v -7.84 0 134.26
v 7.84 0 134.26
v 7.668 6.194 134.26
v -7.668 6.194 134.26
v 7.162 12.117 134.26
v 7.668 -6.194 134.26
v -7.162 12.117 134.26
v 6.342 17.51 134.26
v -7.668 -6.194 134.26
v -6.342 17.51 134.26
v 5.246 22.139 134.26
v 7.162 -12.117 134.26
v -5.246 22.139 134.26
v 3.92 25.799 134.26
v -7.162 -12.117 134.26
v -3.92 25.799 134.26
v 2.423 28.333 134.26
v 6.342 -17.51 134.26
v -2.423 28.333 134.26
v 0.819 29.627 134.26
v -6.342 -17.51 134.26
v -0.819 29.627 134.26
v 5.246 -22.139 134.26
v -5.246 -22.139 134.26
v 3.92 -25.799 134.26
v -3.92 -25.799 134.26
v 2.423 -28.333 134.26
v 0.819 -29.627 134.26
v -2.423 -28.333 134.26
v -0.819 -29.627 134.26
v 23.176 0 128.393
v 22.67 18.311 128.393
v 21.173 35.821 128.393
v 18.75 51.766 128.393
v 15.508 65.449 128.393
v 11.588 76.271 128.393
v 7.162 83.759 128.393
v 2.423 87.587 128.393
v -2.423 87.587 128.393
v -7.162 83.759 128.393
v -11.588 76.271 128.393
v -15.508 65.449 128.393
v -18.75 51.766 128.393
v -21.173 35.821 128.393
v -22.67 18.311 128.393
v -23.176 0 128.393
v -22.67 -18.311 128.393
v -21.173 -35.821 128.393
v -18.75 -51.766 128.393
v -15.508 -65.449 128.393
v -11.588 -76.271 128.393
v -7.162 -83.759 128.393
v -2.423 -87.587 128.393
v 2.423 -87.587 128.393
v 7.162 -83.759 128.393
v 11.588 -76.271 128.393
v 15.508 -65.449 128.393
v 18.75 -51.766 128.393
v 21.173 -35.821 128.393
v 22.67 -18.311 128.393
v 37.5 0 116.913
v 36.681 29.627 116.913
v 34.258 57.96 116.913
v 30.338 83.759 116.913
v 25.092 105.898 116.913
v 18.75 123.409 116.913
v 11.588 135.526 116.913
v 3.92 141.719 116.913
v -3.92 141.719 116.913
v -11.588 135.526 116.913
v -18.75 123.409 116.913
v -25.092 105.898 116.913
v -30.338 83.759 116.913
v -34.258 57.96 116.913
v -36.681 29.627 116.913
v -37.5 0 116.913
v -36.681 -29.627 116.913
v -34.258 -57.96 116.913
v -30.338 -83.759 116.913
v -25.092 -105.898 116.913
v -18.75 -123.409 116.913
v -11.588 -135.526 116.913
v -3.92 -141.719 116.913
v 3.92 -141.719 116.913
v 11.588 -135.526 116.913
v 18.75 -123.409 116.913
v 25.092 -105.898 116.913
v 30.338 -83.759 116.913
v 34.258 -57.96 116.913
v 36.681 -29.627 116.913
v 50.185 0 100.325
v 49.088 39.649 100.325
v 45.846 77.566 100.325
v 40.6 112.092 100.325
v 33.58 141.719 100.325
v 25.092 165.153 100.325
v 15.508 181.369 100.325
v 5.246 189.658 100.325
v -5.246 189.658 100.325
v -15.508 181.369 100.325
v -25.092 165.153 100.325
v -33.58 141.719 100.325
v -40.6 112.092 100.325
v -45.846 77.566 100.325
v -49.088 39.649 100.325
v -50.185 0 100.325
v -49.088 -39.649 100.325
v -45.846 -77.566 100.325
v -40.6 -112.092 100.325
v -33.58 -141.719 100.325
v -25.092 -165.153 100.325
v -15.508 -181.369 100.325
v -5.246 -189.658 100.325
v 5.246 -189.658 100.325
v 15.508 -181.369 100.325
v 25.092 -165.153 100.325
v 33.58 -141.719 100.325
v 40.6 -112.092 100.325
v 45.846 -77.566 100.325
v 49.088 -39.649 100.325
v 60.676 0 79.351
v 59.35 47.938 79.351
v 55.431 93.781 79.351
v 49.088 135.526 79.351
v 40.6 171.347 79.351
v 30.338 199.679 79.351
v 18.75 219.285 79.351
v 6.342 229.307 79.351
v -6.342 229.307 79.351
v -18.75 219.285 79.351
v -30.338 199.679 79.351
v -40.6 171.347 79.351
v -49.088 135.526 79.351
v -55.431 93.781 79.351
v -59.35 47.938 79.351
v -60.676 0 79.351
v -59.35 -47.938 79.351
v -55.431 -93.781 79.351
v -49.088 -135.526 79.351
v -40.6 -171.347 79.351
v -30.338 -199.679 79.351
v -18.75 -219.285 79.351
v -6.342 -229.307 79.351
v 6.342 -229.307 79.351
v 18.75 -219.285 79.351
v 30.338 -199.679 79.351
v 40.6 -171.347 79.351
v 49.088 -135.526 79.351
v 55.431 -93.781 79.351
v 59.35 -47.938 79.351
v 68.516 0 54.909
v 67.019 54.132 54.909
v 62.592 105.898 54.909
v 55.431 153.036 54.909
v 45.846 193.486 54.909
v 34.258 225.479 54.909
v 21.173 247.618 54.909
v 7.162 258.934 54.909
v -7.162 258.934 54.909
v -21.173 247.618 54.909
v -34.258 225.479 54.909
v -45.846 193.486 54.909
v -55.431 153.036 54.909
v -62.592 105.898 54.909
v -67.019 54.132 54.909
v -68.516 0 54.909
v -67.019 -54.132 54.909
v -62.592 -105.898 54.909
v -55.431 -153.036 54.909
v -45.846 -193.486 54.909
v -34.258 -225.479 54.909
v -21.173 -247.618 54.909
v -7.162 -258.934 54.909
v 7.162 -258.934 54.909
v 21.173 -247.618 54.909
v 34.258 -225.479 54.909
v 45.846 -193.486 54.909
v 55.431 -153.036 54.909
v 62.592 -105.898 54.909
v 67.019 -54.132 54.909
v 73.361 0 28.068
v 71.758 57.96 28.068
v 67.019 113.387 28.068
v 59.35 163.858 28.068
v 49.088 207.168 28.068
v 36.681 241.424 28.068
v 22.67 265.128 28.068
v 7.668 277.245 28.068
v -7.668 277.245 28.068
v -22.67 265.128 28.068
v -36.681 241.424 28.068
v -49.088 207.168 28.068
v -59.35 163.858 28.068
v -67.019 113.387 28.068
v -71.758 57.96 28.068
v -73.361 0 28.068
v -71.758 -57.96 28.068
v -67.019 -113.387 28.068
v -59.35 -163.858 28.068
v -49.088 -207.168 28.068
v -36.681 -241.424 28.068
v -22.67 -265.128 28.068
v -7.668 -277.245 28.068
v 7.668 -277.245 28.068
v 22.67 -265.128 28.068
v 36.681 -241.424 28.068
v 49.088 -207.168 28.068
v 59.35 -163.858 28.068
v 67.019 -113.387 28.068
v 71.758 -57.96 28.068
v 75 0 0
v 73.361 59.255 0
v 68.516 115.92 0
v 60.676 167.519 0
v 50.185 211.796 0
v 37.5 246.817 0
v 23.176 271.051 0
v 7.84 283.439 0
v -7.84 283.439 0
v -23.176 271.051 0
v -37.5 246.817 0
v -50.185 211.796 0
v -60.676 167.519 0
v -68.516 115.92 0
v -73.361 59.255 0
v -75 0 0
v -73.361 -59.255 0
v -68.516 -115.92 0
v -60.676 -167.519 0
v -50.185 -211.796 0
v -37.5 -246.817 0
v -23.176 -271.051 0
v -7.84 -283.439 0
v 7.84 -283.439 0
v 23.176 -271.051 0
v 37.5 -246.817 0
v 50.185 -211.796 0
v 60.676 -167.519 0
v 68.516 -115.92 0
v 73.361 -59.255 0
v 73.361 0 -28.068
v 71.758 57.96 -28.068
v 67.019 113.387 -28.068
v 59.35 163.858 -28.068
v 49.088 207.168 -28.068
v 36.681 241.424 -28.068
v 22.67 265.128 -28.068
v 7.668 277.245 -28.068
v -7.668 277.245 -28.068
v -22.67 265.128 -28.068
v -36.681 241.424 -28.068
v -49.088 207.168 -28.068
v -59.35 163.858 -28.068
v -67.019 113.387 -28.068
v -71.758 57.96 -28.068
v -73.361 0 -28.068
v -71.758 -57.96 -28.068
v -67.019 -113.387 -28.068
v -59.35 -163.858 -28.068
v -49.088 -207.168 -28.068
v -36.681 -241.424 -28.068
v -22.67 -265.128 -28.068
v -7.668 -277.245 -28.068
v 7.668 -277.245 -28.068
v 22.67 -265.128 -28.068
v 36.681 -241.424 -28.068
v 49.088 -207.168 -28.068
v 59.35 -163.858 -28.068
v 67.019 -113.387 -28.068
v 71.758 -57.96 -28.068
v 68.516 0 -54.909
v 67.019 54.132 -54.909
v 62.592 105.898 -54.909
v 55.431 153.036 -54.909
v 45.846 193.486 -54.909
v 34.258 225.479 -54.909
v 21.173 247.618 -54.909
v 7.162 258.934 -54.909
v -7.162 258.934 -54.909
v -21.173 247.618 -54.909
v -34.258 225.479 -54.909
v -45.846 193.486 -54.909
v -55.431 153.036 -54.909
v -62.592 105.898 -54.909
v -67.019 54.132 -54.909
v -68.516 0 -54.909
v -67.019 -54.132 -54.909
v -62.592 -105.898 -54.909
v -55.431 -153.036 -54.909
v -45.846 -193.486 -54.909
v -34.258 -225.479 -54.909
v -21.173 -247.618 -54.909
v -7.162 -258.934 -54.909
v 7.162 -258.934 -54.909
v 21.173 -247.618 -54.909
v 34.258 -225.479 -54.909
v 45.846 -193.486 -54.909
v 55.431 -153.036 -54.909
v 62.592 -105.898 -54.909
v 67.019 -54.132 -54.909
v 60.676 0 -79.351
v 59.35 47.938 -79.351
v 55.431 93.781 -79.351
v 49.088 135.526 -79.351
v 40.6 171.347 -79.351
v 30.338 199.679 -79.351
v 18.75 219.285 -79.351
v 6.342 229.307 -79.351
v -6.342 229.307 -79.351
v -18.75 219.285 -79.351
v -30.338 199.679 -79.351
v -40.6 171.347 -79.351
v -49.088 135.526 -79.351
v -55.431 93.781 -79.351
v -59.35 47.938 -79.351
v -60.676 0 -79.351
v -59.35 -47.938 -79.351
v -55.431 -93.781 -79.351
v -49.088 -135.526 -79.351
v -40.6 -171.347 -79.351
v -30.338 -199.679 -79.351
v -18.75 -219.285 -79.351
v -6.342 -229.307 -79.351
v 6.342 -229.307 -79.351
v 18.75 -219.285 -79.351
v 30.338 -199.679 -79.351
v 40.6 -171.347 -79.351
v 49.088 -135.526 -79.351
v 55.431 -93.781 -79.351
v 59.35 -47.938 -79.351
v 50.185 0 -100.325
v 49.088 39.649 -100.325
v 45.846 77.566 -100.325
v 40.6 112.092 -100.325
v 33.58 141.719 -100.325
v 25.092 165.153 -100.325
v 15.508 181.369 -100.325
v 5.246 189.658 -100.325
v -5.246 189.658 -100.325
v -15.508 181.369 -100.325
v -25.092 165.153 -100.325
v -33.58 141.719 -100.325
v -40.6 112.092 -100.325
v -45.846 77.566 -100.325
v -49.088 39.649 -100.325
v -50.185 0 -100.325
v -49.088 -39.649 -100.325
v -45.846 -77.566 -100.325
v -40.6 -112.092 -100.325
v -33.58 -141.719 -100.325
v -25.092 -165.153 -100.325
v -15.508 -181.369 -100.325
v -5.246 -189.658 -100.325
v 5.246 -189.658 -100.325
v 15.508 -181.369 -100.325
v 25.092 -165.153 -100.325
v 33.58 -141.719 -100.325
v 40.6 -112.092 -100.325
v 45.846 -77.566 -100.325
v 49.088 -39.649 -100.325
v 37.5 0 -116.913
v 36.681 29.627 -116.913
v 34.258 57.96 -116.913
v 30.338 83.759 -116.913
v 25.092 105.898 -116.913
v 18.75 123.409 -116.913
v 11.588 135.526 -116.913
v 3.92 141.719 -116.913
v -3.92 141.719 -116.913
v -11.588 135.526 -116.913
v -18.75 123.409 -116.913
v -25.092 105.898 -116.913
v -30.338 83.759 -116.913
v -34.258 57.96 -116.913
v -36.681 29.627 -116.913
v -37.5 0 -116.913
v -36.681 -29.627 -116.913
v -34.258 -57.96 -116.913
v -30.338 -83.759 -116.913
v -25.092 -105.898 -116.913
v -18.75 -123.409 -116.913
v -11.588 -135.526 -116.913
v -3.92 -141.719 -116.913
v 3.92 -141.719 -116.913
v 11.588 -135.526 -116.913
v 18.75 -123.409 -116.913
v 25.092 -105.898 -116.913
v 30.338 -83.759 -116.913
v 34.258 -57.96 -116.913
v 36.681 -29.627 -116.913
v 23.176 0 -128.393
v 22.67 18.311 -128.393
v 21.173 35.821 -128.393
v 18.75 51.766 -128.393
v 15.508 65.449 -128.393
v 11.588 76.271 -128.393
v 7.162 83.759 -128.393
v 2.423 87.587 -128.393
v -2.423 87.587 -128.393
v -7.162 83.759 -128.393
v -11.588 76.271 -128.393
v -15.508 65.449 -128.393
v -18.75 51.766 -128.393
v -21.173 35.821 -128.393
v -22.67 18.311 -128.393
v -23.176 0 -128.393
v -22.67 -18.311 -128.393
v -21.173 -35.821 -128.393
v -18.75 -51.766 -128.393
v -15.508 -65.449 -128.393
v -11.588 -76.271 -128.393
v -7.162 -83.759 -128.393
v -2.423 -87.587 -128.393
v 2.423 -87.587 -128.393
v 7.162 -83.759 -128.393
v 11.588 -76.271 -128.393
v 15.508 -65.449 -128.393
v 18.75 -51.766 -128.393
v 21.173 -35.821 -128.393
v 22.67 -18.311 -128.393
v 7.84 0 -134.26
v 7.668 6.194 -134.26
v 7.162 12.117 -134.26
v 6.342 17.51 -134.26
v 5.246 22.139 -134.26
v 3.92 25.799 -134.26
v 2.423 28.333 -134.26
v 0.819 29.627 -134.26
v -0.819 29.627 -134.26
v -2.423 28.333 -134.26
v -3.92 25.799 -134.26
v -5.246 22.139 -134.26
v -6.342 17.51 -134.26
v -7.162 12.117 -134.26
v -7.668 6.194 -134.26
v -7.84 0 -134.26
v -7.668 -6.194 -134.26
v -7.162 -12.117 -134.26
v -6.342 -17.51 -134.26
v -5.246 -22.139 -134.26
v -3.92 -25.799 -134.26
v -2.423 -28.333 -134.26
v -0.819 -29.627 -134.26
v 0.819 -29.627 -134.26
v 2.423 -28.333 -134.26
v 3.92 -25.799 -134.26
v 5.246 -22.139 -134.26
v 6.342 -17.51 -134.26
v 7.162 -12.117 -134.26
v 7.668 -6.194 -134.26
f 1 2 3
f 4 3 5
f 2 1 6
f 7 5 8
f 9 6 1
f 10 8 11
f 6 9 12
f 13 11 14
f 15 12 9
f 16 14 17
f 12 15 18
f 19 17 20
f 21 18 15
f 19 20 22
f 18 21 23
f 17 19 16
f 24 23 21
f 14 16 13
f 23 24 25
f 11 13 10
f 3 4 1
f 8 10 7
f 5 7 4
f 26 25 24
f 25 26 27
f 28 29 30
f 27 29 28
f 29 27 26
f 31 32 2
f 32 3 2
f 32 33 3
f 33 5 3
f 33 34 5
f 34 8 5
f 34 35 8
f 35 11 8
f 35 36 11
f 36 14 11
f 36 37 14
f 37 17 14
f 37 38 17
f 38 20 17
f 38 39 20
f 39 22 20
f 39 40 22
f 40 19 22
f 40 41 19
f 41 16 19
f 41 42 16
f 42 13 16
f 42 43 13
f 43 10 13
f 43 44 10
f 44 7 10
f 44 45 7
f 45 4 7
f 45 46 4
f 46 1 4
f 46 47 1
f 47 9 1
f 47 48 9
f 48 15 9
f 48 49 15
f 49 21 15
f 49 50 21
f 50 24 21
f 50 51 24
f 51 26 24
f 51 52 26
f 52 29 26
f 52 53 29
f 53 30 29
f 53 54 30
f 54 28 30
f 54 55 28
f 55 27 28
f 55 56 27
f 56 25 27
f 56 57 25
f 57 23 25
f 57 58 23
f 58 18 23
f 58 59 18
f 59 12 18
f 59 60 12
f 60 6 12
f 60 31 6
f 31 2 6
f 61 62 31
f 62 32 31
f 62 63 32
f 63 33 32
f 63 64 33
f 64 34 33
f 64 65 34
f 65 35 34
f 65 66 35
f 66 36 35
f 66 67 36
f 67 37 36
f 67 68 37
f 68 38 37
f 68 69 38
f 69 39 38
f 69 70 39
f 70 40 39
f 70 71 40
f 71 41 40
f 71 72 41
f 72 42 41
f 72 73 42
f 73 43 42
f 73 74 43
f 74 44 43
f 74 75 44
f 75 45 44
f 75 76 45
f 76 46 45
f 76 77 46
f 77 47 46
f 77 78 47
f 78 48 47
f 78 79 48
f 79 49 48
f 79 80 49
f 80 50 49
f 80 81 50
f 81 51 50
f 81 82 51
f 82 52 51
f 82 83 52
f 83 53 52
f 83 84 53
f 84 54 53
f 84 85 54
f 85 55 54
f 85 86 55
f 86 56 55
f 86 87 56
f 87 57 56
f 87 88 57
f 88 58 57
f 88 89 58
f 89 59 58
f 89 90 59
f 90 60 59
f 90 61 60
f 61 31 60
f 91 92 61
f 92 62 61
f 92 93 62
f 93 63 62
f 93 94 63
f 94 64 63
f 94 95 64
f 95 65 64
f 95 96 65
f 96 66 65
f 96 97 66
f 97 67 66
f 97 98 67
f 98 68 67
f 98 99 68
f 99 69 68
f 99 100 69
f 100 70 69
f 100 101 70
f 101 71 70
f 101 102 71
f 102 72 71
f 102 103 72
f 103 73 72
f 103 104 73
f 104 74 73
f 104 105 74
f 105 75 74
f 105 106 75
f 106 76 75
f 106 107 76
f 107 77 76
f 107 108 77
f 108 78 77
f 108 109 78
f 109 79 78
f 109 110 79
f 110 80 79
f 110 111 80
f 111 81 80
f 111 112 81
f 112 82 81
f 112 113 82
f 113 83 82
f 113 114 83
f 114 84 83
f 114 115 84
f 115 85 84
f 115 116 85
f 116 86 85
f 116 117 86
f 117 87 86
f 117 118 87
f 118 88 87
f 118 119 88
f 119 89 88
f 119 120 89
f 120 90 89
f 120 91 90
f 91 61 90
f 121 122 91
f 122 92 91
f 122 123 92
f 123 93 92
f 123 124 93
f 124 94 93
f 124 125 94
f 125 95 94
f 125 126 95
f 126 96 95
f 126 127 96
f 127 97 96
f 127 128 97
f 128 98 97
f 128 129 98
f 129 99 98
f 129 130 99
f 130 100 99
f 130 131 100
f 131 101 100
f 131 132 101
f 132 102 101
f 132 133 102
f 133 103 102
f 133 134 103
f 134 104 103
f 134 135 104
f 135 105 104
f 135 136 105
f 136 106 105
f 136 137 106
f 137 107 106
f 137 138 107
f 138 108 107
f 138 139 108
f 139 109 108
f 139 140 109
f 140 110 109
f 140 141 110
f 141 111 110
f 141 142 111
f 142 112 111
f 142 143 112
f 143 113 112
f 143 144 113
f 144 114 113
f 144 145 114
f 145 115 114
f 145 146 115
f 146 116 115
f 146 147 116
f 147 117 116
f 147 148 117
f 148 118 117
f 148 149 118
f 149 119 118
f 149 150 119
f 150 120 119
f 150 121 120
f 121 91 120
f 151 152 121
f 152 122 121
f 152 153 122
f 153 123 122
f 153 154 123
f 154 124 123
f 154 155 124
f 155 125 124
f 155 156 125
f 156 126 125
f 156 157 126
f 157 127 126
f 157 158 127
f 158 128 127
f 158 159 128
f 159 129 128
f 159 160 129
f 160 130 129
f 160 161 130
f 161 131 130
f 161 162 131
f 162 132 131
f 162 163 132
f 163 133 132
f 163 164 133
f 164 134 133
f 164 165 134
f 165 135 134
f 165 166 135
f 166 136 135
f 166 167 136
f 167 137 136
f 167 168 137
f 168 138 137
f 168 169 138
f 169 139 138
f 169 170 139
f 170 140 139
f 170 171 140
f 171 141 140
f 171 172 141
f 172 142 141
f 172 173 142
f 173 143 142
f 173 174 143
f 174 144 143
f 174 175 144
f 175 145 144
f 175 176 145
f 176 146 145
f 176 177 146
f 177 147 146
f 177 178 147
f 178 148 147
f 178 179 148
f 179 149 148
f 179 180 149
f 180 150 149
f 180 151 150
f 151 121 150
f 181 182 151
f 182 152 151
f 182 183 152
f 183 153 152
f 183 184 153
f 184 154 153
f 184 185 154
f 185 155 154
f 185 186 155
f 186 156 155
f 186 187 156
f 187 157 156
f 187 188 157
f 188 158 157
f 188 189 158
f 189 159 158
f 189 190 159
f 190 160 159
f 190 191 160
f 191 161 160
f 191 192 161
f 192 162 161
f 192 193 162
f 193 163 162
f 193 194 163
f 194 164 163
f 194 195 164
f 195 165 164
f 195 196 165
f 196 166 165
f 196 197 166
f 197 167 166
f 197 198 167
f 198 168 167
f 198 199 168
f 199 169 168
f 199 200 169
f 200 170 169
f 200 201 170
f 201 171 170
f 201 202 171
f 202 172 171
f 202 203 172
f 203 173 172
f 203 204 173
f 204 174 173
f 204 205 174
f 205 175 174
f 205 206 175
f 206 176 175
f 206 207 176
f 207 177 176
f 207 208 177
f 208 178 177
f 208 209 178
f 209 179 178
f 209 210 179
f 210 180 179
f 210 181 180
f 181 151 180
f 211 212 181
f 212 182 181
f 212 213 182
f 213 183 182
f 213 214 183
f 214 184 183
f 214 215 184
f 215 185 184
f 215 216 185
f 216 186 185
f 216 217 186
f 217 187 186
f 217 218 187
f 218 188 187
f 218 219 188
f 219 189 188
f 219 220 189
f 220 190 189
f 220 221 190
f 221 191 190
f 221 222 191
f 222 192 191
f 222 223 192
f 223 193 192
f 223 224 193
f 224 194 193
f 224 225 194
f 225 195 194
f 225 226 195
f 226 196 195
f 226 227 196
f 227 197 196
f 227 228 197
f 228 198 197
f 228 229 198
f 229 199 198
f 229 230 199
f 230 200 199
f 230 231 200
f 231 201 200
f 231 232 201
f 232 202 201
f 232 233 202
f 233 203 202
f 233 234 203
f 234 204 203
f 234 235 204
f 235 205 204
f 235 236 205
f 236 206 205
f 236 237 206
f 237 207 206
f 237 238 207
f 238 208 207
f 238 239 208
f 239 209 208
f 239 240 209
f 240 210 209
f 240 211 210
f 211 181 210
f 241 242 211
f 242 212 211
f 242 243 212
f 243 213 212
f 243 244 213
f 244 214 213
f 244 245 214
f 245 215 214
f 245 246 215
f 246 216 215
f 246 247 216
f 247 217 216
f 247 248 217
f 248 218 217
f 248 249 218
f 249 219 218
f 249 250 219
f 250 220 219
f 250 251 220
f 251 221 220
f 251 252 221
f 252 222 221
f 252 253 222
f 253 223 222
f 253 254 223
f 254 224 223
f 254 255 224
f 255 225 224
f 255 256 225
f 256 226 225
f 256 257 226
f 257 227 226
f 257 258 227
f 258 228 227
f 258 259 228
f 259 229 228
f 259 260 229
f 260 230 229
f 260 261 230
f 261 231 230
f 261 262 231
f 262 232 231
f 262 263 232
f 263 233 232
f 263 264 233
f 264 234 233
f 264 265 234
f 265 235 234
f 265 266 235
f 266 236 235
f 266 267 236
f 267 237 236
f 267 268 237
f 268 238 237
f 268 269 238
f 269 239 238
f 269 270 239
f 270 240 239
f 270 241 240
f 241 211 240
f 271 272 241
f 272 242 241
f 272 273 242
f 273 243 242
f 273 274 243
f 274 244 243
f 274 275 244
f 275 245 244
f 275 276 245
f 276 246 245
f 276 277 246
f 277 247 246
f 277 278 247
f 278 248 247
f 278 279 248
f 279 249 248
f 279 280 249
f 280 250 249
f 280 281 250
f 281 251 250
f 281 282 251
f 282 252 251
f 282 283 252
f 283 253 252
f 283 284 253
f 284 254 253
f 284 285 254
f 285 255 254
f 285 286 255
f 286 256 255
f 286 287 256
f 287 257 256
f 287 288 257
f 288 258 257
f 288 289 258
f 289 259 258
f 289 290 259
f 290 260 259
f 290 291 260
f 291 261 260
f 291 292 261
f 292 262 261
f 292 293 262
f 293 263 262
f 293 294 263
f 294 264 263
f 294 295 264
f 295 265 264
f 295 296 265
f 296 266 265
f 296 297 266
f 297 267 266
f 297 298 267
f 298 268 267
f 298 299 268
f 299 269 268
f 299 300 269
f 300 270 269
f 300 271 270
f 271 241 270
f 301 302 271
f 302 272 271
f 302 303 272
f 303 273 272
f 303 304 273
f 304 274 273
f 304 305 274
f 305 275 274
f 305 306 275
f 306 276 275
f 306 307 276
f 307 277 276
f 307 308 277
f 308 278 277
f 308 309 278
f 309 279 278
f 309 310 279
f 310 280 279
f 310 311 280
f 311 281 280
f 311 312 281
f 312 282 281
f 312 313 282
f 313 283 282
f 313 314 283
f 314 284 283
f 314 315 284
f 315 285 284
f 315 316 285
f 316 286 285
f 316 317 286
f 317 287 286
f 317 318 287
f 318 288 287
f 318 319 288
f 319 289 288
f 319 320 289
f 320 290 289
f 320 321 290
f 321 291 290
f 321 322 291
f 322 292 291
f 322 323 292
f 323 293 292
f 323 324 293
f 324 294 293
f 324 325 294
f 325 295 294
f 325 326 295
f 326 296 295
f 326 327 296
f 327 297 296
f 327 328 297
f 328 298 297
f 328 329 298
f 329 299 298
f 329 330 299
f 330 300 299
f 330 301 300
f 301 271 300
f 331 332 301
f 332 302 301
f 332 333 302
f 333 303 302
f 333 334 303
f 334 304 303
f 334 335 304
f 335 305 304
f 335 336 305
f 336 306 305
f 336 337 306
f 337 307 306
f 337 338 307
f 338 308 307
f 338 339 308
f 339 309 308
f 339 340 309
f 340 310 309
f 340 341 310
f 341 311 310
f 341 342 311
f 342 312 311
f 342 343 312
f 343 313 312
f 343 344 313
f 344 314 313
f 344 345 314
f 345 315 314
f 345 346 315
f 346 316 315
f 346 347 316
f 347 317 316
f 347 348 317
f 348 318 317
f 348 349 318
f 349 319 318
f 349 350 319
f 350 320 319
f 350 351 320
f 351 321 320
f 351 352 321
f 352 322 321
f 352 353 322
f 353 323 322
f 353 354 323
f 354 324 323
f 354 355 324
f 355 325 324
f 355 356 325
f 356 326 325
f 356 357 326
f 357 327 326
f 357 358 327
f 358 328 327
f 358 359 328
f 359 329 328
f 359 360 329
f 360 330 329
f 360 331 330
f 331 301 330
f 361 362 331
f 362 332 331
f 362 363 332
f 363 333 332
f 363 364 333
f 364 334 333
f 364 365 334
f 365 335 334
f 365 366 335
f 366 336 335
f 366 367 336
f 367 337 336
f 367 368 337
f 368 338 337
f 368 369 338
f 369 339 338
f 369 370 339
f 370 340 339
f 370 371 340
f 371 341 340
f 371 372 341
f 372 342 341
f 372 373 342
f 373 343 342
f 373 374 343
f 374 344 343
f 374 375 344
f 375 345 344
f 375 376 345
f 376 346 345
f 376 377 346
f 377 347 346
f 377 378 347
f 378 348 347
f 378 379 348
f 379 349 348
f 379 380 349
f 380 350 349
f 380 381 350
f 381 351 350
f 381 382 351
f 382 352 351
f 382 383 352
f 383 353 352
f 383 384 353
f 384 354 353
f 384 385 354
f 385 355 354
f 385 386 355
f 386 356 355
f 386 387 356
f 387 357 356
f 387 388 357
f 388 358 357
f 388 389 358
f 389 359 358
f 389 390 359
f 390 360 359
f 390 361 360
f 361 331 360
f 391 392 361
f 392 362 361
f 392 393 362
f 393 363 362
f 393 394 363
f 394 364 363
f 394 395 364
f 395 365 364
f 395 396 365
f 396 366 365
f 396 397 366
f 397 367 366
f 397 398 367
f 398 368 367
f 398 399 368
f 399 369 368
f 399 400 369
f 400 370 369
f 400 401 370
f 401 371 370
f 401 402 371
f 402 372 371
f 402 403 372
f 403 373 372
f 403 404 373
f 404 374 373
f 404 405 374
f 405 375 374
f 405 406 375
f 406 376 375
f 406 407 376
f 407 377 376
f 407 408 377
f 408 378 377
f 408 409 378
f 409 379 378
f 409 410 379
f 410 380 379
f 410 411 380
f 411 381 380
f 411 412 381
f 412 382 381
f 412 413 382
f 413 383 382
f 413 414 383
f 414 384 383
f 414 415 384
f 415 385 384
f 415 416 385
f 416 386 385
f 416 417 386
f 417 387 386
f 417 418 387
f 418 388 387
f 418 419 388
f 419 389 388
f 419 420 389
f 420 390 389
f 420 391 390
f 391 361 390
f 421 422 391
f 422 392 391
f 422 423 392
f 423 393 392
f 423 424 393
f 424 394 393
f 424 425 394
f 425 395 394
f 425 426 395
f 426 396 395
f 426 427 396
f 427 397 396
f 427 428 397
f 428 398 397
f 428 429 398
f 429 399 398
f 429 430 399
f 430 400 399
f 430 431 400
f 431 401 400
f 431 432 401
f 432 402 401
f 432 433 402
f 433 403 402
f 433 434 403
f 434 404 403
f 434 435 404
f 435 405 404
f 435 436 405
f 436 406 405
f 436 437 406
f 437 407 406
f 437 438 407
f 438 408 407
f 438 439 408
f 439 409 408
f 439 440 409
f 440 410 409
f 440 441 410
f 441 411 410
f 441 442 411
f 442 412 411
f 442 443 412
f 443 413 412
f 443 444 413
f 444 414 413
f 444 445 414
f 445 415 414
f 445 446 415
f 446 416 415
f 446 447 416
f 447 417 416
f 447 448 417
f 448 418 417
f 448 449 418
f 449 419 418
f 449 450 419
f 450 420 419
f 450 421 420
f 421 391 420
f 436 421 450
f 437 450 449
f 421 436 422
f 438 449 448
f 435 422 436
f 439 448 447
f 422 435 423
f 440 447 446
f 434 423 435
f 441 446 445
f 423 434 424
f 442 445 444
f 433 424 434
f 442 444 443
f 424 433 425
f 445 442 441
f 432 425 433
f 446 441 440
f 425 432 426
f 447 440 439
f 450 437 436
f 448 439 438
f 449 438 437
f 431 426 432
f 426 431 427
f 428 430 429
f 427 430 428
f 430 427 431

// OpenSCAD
// Generated by SolidPython 1.0.1 on 2020-07-29 00:46:47


scale(v = [5, 19, 9]) {
	sphere(r = 15);
}
/***********************************************
*********      SolidPython code:      **********
************************************************
 
# import packages: SolidPython
from solid import *
from solid.utils import *
from itertools import chain, combinations, permutations


class Resize:

    def __init__(self, scad_file):
        self.scad_file = scad_file
        #self.scad_file = import_scad(scad_file)
        # cone/cylinder param:
        self.r1 = 0
        self.r2 = 0
        self.h = 0
        # rectangular prism param:
        self.w = 0
        self.l = 0
        # ellipse param:
        self.r = 0

    # import OpenScad code (file name corresponds to shape)


    # classify shape + parameters
    def assign(self, param1, param2, param3):
        if self.scad_file == 'cone.scad':
            self.r1 = param1
            self.r2 = param2
            self.h = param3
        elif self.scad_file == 'cylinder.scad':
            self.r1 = param1
            self.r2 = param2
            self.h = param3
        elif self.scad_file == 'rectangularPrism.scad':
            self.h = param1
            self.l = param2
            self.w = param3
        else:
            self.r = param1
            self.h = param2

    # resize parameters
    def iterate(self):
        x = range(3, 20, 2)
        i = 1
        if self.scad_file == 'cone.scad':
            tempList = list(permutations(x, 2))
            for temp in tempList:
                param1 = temp[0]
                param2 = temp[1]
                filepath = 'produced_scad_files/' + 'cone' + str(param1) + '_' + str(param2) + '_' + '.scad'
                scad_render_to_file(cylinder(h=param1, r1=param2, r2=0), filepath)

        elif self.scad_file == 'cylinder.scad':
            tempList = list(permutations(x, 3))
            for temp in tempList:
                param1 = temp[0]
                param2 = temp[1]
                filepath = 'produced_scad_files/' + 'cylinder' + str(param1) + '_' + str(param2) + '_' + '.scad'
                scad_render_to_file(cylinder(h=param1, r1=param2, r2=param2), filepath)

        elif self.scad_file == 'rectangularPrism.scad':
            tempList = list(permutations(x, 3))
            for temp in tempList:
                param1 = temp[0]
                param2 = temp[1]
                param3 = temp[2]
                filepath = 'produced_scad_files/' + 'rectangularPrism' + str(param1) + '_' + str(param2) + '_' + str(
                    param3) + '.scad'
                scad_render_to_file(cube(size=(param1, param2, param3)), filepath)

        elif self.scad_file == 'ellipse.scad':
            tempList = list(permutations(x, 4))
            for temp in tempList:
                param1 = temp[0]
                param2 = temp[1]
                param3 = temp[2]
                param4 = temp[3]
                filepath = 'produced_scad_files/' + 'ellipse' + str(param1) + '_' + str(param2) + '_' + str(param3) + '_' + str(param4) + '.scad'
                scad_render_to_file(scale([param1, param2, param3])(sphere(r=param4)), filepath)

    def render_to_scadfile(self):
        scad_render_to_file(scad, 'example.scad') 
 
************************************************/
